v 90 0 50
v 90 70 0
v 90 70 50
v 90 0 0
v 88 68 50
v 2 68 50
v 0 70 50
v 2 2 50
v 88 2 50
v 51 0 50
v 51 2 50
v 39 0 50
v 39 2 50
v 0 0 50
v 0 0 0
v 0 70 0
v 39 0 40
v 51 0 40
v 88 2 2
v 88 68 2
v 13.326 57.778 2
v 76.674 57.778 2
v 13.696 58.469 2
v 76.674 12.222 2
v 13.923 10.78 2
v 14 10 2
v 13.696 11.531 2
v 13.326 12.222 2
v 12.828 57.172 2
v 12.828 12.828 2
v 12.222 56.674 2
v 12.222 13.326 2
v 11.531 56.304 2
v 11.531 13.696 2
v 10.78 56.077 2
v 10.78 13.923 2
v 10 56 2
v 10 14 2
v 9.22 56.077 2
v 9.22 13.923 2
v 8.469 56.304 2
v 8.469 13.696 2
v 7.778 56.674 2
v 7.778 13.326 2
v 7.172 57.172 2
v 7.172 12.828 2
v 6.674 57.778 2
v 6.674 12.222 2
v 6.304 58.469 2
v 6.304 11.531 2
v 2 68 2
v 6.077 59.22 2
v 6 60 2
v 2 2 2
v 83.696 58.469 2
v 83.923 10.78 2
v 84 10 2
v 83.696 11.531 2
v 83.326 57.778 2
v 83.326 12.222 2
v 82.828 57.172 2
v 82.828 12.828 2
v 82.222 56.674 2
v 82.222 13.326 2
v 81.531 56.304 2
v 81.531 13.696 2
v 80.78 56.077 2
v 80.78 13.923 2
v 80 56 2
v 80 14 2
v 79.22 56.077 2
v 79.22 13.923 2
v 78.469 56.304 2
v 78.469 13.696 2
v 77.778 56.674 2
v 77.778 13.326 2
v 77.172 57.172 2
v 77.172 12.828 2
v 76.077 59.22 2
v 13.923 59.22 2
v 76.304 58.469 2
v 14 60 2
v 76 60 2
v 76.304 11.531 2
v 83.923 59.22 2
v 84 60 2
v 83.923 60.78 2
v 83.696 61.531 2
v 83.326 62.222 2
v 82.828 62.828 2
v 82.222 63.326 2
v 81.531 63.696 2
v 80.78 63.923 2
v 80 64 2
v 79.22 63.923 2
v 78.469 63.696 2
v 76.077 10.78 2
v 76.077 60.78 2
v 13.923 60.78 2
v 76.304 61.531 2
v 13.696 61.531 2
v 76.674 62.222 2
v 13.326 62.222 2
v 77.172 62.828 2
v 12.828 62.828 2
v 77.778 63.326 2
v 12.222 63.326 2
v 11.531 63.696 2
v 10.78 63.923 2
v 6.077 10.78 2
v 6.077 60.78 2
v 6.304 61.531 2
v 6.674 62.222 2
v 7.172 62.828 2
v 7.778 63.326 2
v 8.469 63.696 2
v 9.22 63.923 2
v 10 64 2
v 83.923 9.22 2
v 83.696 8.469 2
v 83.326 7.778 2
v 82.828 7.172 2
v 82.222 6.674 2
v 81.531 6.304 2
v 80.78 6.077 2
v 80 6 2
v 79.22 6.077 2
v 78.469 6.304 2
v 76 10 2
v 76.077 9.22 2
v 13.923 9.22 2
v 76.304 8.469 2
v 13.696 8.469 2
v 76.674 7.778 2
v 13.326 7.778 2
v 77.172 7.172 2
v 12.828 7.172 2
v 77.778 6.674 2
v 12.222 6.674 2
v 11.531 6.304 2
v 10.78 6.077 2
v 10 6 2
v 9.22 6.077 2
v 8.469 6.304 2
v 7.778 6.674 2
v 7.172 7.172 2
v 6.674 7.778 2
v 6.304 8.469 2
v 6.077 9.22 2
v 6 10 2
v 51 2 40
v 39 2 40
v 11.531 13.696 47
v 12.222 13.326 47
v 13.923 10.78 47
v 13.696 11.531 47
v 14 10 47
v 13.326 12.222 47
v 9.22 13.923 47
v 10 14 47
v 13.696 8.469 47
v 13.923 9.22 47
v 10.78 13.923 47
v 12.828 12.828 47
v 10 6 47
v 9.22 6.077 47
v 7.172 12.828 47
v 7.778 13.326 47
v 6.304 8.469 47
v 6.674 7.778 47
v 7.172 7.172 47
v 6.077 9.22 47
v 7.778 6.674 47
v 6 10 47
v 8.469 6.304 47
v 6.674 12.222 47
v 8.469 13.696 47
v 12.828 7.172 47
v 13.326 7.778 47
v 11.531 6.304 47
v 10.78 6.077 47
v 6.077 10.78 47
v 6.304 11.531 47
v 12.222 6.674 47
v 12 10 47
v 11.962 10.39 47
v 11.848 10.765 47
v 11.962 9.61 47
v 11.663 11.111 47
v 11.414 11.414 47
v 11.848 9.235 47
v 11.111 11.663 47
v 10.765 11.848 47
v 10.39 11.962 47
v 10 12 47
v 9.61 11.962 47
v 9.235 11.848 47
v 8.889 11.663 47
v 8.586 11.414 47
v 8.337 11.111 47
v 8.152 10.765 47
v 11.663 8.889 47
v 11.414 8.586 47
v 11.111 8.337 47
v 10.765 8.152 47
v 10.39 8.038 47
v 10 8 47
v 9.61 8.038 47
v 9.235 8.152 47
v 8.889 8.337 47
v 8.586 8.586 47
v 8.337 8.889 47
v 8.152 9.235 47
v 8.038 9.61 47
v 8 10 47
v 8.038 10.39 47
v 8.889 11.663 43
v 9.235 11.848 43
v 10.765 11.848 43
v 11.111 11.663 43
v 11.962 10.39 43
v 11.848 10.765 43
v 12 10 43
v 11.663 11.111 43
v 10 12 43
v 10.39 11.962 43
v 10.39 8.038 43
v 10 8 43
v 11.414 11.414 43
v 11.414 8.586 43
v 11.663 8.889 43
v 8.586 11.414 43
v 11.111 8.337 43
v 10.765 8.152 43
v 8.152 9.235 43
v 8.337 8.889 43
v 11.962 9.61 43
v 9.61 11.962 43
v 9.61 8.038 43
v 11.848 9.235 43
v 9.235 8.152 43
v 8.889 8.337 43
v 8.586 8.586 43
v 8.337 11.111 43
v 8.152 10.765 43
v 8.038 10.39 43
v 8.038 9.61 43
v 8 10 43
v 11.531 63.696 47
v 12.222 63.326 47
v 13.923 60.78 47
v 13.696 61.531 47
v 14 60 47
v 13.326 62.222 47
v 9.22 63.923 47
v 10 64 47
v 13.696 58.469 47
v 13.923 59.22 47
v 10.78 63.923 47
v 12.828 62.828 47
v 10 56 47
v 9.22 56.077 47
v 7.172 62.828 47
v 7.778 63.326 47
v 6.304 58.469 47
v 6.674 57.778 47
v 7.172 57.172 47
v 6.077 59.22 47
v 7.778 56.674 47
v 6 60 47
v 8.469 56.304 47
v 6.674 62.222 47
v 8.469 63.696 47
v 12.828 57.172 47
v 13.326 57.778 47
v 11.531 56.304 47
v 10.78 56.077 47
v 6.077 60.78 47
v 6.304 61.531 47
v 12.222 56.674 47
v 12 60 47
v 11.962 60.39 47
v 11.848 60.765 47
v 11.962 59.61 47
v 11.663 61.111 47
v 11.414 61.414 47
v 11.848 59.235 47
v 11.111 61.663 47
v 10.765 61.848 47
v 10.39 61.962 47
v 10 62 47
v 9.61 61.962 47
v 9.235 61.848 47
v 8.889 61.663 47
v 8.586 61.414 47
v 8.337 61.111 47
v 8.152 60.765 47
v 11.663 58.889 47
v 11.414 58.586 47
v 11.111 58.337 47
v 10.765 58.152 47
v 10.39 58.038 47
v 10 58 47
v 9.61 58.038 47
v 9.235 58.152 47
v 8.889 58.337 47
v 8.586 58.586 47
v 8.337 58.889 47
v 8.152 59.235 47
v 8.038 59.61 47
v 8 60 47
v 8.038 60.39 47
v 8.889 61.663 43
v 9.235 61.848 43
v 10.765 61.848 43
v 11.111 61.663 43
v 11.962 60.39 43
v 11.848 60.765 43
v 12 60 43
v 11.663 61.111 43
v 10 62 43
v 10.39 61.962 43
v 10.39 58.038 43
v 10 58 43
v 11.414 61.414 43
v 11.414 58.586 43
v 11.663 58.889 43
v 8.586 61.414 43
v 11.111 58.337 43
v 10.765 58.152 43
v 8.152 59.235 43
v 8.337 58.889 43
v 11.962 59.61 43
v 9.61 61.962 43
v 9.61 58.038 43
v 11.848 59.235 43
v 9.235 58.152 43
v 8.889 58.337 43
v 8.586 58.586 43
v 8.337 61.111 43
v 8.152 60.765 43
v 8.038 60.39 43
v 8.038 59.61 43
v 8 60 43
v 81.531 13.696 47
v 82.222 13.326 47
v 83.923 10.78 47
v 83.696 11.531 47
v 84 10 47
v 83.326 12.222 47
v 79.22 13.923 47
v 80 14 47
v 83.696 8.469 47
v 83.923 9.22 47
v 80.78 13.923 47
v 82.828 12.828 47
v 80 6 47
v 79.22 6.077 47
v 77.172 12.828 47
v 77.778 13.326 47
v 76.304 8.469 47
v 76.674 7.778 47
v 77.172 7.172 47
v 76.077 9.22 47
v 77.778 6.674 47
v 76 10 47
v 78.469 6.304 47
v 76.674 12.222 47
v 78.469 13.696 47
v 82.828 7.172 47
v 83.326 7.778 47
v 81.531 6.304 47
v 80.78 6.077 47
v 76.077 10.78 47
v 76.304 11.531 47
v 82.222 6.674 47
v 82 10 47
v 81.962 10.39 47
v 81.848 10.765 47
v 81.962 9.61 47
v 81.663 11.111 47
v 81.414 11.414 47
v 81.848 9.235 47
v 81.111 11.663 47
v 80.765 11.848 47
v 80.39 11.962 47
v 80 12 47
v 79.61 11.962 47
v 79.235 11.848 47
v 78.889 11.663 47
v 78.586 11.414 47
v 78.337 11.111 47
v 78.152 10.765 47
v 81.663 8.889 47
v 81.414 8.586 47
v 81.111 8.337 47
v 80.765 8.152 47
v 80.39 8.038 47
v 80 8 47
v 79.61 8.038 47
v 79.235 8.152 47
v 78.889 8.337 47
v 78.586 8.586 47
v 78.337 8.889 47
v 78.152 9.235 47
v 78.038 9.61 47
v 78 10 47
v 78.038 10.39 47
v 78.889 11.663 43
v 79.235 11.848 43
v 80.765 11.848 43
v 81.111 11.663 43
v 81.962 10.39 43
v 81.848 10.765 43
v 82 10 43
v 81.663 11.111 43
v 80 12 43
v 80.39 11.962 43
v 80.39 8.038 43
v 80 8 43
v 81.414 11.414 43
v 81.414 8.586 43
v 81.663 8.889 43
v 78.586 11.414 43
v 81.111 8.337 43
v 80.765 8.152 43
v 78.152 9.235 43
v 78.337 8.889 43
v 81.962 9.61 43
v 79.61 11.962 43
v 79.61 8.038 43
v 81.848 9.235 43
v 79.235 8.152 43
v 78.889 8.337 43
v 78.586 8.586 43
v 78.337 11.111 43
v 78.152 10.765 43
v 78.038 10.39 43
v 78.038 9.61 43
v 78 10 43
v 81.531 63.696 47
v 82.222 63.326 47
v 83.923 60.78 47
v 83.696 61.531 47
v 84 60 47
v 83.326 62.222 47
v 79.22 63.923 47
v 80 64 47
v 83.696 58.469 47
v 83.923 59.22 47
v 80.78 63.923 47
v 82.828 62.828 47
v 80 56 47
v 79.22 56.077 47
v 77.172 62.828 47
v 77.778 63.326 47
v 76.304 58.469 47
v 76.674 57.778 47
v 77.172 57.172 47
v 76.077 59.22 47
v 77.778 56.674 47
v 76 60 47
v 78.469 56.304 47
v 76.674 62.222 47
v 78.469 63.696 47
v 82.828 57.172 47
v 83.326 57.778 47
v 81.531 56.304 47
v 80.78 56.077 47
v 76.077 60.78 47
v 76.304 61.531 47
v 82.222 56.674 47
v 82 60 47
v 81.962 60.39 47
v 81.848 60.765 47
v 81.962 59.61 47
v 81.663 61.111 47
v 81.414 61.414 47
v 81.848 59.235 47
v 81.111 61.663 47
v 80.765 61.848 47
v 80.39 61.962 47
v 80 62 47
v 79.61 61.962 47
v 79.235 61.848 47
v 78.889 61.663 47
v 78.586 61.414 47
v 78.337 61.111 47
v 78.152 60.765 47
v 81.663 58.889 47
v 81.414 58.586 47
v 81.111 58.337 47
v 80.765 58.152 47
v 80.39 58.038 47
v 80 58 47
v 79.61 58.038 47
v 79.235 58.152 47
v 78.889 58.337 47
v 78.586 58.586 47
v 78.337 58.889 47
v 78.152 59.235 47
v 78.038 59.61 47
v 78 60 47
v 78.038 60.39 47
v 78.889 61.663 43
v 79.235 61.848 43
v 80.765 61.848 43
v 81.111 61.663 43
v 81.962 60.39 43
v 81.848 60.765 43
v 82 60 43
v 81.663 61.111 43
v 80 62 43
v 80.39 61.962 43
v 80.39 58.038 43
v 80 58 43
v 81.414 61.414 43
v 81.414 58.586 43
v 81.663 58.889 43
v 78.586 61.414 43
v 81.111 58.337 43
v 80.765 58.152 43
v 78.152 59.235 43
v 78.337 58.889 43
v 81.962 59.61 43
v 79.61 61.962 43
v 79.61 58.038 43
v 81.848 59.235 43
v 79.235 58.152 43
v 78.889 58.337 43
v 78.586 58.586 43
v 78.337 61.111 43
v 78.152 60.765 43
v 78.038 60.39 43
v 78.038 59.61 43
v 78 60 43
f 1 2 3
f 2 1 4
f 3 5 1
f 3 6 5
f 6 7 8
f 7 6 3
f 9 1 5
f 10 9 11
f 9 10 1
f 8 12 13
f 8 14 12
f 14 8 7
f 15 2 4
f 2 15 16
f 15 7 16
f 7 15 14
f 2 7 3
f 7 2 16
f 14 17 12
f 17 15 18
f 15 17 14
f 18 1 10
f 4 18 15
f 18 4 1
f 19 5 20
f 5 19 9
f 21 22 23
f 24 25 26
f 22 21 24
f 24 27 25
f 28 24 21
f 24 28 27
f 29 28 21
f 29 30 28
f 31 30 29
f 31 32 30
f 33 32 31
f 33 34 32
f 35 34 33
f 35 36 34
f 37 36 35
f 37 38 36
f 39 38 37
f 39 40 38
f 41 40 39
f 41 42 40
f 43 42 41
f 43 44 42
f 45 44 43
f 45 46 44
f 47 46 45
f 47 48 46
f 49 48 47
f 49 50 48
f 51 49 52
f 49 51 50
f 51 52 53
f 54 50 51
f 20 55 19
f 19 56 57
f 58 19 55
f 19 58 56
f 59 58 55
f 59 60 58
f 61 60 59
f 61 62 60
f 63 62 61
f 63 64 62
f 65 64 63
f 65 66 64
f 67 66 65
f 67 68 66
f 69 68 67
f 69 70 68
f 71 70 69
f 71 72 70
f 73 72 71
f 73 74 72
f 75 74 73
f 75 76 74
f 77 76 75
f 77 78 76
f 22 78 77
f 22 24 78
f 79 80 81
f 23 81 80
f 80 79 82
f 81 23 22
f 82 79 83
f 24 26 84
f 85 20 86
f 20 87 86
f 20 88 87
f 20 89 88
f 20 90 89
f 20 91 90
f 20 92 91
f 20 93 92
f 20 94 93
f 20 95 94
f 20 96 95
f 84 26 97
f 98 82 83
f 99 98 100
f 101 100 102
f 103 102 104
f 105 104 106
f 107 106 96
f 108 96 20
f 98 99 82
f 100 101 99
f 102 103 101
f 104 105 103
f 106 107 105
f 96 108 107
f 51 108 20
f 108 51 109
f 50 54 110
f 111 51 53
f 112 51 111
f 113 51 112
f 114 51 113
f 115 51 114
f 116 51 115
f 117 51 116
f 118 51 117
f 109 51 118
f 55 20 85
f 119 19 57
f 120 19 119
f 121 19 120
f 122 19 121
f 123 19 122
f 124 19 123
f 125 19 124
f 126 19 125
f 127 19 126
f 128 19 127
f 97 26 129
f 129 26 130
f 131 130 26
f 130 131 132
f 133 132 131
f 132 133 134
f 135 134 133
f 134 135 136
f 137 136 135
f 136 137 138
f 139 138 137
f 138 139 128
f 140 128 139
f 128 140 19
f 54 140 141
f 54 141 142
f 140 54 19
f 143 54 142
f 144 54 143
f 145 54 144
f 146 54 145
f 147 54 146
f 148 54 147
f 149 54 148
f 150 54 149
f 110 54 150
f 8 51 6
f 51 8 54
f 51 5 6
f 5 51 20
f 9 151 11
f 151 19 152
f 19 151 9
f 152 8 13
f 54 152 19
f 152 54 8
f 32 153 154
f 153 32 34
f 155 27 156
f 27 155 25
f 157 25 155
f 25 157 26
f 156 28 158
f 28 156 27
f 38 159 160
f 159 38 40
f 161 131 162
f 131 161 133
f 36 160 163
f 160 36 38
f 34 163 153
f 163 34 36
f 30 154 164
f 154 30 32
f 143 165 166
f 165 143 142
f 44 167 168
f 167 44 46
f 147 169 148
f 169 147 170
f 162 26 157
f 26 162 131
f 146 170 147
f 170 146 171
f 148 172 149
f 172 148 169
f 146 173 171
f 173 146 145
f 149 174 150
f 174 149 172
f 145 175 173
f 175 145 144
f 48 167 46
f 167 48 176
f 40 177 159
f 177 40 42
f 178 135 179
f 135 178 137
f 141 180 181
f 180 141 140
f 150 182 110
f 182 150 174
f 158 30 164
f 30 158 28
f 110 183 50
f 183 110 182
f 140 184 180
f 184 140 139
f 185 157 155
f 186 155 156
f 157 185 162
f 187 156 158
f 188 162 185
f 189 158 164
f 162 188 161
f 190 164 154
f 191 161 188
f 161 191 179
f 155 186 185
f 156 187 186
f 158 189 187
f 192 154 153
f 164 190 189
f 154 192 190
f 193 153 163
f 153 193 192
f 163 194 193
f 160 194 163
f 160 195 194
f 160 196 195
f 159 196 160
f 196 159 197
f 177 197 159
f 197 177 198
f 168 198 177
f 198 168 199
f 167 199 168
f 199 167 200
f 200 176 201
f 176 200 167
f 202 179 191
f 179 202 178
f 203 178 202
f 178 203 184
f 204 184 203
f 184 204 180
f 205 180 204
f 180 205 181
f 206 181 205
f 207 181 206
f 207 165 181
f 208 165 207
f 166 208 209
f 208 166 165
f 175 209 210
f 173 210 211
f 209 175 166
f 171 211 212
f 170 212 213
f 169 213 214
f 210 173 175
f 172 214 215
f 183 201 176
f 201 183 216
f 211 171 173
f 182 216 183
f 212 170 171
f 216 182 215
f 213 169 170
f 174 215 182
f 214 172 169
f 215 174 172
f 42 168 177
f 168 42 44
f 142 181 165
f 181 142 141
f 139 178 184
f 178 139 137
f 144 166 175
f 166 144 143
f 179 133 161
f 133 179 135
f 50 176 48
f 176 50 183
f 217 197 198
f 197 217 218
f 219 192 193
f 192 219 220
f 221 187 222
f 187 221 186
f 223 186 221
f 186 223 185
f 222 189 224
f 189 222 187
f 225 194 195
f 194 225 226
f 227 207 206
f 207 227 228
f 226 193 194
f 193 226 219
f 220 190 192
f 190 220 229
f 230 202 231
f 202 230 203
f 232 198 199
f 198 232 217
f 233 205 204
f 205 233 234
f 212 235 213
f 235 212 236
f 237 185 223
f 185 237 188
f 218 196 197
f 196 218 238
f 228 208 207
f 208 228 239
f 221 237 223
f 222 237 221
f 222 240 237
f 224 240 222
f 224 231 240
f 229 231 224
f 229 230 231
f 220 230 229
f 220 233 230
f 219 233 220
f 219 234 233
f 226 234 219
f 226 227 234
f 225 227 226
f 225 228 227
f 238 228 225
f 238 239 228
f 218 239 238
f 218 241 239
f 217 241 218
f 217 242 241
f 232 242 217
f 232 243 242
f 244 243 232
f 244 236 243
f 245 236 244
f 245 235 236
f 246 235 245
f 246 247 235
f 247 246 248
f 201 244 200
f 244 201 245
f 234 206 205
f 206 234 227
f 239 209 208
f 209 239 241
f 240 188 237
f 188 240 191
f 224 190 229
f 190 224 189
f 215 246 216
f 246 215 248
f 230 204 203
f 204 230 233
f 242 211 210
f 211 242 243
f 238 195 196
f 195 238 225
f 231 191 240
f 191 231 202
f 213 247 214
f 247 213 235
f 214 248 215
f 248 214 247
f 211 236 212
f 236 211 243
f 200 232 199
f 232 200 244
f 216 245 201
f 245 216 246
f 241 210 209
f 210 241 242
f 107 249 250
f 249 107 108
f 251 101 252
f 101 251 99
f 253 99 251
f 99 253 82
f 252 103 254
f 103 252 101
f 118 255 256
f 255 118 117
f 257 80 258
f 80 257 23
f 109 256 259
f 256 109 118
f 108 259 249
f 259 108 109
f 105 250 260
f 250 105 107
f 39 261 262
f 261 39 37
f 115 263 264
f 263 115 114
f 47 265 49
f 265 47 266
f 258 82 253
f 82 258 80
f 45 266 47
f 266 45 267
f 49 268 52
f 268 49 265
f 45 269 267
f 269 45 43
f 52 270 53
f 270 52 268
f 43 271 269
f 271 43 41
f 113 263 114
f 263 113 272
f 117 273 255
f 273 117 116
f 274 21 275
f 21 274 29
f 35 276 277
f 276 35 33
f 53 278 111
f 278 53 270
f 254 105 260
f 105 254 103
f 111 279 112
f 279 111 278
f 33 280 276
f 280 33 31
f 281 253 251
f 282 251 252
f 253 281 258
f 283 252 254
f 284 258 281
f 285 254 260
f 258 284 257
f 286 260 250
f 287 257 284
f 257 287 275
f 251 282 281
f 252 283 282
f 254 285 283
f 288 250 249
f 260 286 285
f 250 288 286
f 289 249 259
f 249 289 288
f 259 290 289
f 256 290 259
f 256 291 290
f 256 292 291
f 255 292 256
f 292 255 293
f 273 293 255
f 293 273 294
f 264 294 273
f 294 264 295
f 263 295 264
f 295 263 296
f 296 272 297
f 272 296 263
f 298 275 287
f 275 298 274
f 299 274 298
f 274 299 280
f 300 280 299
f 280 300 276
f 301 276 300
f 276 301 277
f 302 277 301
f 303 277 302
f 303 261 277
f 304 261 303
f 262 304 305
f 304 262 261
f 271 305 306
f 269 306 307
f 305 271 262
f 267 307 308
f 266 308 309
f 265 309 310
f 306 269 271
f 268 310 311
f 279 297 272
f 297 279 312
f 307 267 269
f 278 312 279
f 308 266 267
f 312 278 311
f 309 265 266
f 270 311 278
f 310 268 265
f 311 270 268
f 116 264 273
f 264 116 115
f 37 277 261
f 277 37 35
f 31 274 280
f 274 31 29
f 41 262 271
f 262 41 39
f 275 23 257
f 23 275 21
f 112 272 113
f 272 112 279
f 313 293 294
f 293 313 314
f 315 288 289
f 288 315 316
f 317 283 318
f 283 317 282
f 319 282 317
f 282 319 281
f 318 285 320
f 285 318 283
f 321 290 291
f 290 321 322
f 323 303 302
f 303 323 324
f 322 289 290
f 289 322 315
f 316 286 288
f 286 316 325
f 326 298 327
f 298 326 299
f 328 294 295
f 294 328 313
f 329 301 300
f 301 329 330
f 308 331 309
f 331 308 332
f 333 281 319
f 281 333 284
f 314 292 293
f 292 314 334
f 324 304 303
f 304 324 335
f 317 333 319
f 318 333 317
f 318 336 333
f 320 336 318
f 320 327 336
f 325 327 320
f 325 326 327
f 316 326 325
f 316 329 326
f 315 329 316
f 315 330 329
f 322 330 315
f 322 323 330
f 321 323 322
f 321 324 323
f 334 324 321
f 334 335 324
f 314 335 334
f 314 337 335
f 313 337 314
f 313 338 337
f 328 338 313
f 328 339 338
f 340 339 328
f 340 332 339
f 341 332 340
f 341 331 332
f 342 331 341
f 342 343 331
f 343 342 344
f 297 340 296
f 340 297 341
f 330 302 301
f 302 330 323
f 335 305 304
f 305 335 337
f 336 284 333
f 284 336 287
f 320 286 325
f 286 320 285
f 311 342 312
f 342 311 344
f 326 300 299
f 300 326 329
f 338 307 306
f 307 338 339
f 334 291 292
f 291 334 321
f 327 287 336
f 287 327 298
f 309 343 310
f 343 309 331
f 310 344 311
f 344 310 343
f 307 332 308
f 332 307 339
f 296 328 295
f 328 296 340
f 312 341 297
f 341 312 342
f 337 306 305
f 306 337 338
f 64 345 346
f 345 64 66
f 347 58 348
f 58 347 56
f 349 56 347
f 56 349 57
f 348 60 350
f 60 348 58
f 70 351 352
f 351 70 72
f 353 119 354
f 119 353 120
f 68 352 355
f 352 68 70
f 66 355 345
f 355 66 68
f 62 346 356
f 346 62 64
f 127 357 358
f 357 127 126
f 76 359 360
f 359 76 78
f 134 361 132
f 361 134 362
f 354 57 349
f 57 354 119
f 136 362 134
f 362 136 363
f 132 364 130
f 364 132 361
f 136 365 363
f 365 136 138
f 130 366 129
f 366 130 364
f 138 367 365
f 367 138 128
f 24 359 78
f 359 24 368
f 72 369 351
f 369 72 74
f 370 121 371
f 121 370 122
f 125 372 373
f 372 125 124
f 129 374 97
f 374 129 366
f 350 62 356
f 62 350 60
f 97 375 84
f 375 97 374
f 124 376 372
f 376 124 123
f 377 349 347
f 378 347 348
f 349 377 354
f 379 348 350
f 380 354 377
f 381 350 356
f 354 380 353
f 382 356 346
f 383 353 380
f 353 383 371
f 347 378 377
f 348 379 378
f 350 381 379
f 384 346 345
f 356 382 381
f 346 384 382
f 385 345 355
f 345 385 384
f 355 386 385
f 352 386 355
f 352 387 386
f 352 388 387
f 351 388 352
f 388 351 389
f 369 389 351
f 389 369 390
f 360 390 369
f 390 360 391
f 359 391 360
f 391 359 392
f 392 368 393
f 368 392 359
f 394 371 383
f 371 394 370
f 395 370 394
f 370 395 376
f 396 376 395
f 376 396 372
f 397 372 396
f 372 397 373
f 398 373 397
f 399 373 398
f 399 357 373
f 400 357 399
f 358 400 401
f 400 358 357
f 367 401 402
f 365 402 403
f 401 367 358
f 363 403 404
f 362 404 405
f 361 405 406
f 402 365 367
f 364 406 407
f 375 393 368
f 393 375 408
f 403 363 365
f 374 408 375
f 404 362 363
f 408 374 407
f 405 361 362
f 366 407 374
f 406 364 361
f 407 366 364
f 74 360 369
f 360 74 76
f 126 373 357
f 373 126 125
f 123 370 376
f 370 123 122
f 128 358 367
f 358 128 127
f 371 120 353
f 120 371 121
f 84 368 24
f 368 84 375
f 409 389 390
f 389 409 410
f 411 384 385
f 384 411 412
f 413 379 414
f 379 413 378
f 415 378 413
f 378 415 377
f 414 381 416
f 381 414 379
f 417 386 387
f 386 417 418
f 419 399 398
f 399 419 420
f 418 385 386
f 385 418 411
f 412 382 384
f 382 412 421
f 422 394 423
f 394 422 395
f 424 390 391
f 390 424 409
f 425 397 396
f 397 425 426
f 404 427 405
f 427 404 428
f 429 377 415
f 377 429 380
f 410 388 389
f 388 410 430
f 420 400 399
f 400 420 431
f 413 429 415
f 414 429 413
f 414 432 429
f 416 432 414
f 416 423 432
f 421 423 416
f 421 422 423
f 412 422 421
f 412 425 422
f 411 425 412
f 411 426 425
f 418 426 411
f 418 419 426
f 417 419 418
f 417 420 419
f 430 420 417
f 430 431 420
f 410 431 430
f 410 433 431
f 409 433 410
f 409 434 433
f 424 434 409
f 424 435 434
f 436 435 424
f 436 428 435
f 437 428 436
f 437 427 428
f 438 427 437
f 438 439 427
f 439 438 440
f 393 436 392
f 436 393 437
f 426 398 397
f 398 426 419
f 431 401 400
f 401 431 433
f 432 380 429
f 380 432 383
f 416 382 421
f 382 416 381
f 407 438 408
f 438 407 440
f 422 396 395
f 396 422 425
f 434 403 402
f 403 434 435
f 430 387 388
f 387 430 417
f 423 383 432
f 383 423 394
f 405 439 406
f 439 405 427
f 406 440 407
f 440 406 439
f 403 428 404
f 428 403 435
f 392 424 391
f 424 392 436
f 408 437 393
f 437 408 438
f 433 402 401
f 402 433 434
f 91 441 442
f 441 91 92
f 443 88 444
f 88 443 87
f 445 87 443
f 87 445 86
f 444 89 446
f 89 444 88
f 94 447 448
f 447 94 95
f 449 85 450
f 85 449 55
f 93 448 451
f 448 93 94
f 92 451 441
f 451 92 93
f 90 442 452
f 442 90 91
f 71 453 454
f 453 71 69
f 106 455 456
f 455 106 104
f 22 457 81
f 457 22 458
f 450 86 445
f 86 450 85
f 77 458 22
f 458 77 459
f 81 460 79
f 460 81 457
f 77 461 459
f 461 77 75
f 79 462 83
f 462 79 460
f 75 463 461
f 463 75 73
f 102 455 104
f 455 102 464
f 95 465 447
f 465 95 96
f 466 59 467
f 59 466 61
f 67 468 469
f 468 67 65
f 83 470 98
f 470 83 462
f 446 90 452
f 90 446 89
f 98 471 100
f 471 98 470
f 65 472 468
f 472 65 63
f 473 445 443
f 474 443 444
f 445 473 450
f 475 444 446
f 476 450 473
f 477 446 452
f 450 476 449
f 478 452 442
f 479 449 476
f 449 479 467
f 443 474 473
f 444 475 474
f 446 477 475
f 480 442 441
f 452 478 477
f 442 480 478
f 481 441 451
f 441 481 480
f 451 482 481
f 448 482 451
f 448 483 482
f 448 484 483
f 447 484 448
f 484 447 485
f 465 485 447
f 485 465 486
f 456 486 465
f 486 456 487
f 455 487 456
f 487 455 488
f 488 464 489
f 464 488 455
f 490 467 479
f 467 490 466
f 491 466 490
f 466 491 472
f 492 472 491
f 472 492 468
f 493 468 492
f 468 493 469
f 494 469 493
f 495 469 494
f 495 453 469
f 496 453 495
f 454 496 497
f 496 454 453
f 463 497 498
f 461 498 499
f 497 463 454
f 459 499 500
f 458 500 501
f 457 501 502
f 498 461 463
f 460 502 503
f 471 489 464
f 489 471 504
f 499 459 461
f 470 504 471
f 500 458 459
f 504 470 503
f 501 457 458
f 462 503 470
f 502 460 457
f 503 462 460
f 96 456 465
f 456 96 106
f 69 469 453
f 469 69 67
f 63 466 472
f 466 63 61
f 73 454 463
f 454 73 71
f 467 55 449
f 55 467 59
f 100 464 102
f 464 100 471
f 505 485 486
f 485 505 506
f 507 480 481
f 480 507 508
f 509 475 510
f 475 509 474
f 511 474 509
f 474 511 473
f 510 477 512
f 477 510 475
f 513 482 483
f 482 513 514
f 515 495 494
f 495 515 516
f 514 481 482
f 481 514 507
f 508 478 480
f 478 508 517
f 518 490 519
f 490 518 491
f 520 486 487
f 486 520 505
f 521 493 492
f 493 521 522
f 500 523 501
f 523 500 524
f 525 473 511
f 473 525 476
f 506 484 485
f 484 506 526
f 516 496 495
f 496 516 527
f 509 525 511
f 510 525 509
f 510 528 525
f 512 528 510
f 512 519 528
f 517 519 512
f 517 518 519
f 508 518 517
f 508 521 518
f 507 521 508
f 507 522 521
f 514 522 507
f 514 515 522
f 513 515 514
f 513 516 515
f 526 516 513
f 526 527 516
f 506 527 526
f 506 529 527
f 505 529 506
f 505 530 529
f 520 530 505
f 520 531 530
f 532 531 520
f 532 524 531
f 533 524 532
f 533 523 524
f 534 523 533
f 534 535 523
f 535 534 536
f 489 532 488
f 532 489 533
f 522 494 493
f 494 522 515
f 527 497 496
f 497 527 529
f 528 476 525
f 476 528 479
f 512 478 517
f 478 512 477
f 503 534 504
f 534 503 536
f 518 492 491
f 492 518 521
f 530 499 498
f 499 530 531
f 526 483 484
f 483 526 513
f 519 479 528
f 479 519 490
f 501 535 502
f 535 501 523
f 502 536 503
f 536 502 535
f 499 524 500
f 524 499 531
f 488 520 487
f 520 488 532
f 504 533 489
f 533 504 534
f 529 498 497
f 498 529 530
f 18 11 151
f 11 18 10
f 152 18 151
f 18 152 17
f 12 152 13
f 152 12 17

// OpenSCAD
$fn = 32;

// ----------------------------------------------------------------------
// Enclosure box: both enclosure
// ----------------------------------------------------------------------

// --- parameters (mm) ---
box_l = 90;               // outer length, X
box_w = 70;               // outer width, Y
box_h = 50;               // outer height
wall_t = 2;               // wall thickness
boss_r = 4;               // corner boss radius
hole_r = 2;               // boss screw hole radius
boss_in = 10;             // boss inset from the corners
notch_w = 12;             // cable notch width
notch_h = 10;             // cable notch height

inner_h = box_h - wall_t;  // cavity depth
boss_h = inner_h - 2;  // corner boss height

difference() {
  union() {
    difference() {
      cube([box_l, box_w, box_h]);
      translate([wall_t, wall_t, wall_t])
        cube([box_l - 2 * wall_t, box_w - 2 * wall_t, box_h]);
    }
    for (sx = [0, 1], sy = [0, 1])
      translate([sx ? box_l - boss_in : boss_in,
                 sy ? box_w - boss_in : boss_in, wall_t - 1])
        difference() {
          cylinder(r = boss_r, h = boss_h);
          translate([0, 0, boss_h - 4])
            cylinder(r = hole_r, h = 5);
        }
  }
  translate([box_l / 2 - notch_w / 2, -1, box_h - notch_h])
    cube([notch_w, wall_t + 2, notch_h + 1]);
}
